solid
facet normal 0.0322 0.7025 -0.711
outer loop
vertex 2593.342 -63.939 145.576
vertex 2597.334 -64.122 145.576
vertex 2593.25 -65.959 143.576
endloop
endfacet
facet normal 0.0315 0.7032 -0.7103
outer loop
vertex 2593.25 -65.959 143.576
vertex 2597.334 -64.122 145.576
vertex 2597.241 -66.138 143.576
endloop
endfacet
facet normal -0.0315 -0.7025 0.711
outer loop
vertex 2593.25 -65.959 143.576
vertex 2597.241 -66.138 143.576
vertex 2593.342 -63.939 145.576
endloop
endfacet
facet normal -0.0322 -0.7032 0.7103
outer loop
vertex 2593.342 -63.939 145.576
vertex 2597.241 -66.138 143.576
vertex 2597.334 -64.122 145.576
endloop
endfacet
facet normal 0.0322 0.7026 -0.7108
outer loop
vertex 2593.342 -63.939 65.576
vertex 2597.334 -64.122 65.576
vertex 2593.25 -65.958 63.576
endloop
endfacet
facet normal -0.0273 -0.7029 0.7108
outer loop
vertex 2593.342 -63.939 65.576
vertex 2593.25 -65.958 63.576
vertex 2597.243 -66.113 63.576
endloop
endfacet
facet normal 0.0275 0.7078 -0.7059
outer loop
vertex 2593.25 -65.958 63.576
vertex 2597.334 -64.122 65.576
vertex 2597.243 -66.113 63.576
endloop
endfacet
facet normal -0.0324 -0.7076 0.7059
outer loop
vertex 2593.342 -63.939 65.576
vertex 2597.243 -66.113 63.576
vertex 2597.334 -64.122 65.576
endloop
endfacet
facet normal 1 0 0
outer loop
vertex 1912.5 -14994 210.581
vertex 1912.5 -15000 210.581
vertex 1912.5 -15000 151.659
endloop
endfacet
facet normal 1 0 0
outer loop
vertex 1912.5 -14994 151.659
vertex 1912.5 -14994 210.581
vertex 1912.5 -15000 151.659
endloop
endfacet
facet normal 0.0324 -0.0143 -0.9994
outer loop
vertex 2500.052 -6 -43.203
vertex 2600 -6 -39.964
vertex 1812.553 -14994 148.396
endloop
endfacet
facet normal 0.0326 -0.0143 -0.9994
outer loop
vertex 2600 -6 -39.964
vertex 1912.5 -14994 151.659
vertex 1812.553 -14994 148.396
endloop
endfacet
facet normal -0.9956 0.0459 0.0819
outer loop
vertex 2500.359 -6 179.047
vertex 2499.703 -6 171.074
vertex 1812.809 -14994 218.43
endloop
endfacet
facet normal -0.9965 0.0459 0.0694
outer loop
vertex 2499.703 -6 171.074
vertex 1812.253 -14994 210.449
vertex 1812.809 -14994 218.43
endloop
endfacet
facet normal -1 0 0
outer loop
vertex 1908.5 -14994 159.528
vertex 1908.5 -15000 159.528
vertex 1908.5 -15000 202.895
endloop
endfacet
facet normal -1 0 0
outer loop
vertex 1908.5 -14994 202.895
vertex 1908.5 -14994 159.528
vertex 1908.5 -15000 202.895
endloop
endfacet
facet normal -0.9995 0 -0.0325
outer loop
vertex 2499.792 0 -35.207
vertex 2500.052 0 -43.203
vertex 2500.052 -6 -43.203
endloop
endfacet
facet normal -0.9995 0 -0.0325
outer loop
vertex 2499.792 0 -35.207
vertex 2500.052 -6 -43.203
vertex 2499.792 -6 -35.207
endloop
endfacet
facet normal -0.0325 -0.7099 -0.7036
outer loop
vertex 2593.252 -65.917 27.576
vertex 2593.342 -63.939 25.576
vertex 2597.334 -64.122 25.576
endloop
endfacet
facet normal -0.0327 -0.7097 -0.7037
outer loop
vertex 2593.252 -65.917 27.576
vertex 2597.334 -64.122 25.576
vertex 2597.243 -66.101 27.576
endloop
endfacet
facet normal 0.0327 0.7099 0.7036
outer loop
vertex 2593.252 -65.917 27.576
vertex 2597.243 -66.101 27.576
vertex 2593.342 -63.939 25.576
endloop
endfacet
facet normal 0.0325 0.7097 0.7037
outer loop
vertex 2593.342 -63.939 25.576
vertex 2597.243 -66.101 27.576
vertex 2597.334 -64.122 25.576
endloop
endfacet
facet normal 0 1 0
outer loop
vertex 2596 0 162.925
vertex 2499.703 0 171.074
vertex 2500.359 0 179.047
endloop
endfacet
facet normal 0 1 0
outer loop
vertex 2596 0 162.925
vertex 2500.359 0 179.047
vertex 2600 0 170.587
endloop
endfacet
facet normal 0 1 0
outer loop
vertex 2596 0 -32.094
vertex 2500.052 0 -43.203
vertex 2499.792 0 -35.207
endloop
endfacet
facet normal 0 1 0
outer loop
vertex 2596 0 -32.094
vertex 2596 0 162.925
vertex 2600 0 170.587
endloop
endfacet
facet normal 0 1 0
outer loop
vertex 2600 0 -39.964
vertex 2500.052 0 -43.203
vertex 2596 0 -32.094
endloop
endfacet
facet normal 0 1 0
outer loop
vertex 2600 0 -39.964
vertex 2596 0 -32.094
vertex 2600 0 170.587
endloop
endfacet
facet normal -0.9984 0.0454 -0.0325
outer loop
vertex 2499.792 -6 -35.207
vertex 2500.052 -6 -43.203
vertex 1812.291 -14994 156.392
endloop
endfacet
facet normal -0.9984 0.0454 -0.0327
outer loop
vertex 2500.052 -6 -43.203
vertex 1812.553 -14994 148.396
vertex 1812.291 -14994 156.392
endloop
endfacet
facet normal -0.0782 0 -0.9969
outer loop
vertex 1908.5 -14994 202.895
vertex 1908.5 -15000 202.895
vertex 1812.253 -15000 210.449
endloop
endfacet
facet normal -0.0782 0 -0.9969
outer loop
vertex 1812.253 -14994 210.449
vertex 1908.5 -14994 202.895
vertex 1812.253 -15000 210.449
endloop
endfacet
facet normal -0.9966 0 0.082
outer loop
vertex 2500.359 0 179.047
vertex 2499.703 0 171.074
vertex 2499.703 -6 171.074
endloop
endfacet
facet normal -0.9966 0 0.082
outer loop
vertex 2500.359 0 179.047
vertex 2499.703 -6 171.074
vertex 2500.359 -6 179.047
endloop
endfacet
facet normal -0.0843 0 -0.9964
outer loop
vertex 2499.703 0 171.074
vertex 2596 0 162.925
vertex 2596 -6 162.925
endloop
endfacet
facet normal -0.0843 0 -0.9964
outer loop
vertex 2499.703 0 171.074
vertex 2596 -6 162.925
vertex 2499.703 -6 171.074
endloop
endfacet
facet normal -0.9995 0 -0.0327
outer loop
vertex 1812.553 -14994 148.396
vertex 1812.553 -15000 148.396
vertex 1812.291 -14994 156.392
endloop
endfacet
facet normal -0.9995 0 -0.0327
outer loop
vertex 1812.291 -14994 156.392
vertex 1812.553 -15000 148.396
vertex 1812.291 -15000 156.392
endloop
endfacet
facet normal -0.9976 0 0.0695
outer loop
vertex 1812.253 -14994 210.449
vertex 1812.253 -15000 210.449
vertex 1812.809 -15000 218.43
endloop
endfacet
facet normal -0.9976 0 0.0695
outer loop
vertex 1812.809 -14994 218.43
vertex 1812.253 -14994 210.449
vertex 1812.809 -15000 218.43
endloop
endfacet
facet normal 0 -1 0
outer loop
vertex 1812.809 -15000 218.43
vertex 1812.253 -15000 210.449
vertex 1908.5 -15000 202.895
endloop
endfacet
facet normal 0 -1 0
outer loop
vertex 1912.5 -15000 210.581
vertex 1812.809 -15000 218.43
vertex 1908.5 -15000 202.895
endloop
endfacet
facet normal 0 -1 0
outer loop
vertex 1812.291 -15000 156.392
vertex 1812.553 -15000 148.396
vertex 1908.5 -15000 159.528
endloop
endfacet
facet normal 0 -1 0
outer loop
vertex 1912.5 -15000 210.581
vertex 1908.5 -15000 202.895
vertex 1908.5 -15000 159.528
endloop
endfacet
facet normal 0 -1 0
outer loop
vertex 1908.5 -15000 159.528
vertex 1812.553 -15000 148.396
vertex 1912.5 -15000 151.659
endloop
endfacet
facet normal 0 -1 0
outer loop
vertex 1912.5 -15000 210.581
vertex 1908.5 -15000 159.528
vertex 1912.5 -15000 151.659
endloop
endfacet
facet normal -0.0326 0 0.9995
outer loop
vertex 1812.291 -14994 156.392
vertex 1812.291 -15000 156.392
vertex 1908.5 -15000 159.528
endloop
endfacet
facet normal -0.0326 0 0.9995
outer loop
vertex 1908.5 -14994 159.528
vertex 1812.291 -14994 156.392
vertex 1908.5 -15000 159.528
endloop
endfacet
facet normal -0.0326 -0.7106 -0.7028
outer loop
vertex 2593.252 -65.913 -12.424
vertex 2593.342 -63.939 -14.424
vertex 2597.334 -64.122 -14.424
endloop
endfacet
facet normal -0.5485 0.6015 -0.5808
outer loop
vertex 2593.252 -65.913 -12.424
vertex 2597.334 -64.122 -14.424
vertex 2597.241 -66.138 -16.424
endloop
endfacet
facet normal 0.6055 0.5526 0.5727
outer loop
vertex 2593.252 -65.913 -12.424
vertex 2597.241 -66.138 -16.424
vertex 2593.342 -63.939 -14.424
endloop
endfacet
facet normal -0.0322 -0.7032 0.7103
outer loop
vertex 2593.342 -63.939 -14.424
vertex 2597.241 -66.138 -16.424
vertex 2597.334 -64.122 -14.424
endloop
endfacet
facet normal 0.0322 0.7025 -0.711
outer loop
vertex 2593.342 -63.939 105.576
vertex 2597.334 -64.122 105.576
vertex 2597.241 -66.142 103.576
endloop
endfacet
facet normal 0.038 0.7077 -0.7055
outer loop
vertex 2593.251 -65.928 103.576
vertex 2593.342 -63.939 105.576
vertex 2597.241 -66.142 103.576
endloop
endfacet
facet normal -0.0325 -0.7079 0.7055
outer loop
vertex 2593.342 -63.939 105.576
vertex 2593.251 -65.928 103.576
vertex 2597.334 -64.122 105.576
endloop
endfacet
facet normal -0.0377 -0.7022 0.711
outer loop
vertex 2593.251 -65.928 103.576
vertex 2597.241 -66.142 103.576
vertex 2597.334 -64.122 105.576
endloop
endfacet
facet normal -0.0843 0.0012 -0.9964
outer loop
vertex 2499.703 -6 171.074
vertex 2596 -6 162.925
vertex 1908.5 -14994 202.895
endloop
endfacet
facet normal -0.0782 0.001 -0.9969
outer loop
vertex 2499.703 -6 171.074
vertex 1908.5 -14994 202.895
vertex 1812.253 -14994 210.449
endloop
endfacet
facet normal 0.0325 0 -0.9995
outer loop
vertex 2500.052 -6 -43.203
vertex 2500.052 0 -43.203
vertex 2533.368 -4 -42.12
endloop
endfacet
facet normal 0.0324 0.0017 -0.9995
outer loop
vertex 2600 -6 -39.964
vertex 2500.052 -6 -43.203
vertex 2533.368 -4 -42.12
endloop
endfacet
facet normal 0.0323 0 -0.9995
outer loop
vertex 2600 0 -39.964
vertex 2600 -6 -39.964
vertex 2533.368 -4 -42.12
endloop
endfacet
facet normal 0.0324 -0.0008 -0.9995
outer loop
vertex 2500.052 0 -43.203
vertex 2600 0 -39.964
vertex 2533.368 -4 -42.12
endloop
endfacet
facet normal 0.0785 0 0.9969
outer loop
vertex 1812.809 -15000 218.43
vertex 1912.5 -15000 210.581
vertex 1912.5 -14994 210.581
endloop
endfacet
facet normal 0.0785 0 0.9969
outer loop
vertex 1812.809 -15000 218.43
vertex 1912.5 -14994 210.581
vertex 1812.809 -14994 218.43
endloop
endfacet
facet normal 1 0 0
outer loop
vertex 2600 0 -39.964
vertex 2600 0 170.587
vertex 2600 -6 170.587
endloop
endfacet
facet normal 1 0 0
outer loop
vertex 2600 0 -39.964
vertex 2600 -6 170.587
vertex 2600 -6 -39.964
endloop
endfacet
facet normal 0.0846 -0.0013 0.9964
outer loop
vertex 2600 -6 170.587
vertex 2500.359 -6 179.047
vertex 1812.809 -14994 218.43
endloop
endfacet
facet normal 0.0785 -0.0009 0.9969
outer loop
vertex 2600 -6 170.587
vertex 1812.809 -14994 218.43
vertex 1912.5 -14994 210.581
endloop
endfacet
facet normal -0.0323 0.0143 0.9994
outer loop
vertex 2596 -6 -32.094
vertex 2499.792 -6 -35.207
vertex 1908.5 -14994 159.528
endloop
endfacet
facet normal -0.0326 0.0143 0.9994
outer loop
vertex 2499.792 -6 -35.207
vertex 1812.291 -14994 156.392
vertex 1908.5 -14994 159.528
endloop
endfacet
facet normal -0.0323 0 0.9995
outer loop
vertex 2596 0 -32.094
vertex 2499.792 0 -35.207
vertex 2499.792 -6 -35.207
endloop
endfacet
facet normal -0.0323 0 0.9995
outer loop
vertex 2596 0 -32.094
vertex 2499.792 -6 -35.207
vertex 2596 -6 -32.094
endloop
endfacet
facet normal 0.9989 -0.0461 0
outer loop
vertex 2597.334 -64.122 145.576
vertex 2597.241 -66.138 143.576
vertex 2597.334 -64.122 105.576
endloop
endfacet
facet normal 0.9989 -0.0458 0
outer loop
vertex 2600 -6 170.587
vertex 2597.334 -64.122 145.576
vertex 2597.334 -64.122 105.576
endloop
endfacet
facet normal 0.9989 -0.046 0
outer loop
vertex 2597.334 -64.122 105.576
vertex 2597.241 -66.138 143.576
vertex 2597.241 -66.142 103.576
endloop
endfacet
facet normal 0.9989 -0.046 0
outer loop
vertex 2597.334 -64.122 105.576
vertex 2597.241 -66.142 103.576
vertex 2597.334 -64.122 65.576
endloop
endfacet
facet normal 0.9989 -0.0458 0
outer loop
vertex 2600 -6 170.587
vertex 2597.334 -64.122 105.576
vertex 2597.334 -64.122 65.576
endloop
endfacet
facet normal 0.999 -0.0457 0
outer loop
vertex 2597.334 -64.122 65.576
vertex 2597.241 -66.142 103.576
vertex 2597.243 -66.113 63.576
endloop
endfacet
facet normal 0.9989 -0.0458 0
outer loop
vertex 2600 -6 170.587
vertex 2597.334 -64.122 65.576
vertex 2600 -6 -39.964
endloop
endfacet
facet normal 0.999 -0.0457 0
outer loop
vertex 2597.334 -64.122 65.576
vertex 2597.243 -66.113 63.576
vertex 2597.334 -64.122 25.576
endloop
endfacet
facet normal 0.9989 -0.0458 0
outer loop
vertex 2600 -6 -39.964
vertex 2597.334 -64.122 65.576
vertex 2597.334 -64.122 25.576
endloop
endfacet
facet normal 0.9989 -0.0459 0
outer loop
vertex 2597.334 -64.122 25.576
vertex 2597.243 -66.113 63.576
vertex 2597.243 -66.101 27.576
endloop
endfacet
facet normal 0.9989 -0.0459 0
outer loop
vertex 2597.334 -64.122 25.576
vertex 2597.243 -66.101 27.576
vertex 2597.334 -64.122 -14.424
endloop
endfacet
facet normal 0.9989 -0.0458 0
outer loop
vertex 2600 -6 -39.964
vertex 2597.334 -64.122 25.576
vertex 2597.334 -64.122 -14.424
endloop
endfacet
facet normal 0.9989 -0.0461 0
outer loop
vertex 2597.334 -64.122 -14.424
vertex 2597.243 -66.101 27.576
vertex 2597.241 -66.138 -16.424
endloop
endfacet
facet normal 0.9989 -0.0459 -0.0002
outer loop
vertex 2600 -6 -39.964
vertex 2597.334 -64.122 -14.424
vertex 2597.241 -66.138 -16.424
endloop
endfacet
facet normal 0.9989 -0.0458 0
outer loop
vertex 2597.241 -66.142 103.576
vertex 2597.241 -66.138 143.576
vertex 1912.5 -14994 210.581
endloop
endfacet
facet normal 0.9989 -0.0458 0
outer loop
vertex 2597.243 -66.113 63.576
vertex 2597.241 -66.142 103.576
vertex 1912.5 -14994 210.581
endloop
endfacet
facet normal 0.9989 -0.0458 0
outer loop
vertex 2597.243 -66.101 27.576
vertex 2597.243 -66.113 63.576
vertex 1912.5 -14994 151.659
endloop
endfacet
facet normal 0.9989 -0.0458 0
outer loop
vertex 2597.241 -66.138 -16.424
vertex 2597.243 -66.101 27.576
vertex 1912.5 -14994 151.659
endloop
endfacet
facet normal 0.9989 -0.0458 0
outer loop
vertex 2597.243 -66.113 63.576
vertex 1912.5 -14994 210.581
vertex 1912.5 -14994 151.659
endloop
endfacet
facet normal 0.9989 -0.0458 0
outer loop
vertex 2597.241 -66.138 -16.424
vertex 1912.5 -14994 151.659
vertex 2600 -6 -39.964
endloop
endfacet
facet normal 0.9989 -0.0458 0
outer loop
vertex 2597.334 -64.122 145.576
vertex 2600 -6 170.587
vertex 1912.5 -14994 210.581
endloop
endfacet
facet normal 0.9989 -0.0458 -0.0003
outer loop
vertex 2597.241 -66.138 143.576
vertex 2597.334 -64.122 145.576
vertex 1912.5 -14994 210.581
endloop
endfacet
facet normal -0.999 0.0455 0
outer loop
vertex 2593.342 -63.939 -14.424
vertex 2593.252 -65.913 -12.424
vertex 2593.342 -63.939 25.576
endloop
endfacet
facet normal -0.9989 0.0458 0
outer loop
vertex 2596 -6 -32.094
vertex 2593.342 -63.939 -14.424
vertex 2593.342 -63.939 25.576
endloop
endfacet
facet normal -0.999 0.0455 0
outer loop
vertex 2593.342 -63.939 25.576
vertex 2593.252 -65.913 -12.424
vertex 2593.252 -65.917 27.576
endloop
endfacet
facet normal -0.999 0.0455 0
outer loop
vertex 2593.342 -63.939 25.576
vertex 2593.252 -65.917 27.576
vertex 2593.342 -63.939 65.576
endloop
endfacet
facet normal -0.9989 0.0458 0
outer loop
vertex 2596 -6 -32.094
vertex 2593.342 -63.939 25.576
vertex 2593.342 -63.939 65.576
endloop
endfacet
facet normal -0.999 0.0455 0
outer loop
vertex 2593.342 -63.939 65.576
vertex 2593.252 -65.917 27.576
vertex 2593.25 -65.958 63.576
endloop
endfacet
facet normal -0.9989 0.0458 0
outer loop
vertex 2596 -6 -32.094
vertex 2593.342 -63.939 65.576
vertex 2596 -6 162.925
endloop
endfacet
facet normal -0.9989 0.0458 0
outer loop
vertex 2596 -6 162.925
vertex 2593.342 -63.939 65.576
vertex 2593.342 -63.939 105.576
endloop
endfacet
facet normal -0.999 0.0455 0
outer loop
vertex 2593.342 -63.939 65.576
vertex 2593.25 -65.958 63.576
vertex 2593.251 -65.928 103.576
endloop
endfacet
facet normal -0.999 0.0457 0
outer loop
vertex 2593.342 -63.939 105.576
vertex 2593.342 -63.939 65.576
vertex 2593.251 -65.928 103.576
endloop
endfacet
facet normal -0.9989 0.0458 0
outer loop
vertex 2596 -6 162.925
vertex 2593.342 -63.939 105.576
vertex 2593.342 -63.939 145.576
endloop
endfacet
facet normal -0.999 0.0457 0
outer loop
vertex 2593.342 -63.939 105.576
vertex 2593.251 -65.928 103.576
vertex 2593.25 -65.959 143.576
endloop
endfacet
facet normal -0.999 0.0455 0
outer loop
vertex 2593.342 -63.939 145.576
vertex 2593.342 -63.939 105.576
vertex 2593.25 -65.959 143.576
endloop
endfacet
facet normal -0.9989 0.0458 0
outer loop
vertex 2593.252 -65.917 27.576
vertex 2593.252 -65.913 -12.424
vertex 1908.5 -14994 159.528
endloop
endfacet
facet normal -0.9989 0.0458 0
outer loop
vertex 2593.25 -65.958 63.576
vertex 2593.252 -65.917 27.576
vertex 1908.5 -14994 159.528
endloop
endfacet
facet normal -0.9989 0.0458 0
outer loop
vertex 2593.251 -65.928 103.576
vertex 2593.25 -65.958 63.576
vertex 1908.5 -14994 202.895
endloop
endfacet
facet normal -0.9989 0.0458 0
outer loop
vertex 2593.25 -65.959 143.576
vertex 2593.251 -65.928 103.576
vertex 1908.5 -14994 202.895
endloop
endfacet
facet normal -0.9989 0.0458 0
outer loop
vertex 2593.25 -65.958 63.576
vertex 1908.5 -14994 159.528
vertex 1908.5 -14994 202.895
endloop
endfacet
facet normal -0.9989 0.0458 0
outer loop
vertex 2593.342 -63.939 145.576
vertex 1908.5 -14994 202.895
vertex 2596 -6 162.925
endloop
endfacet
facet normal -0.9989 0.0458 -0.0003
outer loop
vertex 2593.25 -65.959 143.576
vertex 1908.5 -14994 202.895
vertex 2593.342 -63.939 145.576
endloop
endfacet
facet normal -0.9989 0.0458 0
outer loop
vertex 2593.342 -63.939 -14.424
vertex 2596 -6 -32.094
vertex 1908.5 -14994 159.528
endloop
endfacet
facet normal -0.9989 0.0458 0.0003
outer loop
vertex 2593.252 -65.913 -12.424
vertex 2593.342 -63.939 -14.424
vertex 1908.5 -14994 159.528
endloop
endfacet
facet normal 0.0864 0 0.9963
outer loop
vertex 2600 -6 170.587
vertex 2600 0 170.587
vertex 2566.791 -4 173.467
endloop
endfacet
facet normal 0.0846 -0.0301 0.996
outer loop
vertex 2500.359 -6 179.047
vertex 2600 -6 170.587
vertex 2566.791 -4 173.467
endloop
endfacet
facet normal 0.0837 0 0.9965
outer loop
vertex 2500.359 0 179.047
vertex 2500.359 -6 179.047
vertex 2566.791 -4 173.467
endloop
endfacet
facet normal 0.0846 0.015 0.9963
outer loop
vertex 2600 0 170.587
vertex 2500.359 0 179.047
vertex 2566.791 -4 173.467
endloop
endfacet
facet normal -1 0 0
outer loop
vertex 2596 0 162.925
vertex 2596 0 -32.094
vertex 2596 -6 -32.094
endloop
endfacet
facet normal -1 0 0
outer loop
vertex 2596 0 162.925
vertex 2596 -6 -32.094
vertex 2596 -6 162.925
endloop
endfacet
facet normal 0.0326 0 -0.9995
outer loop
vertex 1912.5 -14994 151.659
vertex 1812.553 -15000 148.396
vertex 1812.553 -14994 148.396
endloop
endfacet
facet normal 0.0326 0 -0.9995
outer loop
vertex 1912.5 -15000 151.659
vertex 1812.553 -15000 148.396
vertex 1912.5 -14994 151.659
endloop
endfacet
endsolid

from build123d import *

# Parameters (mm, degrees)
BOSS_EXTRUDE1_DEPTH       = 6
BOSS_EXTRUDE2_DEPTH       = 6
F_4_0MM_DOWEL_HOLE1_D     = 4
F_4_0MM_DOWEL_HOLE1_DEPTH = 691.048650037


with BuildPart() as part:
    # Sketch1 → Boss-Extrude1 (new body)
    with BuildSketch(Plane(origin=(0, 0, 0), x_dir=(1, 0, 0), z_dir=(0, 1, 0))):
        with BuildLine():
            Line((2600, -170.586848035), (2600, 39.964081965))
            add(Edge.make_bspline(
                [(2500.052462015, 43.202855025), (2533.368165788, 42.118735422), (2566.684003357, 41.038906482), (2600, 39.964081965)],
                knots=[0.814310206, 0.814310206, 0.814310206, 0.814310206, 0.826684648, 0.826684648, 0.826684648, 0.826684648], degree=3))
            Line((2500.052462015, 43.202855025), (2499.792273349, 35.207087279))
            Line((2499.792273349, 35.207087279), (2596, 32.093533273))
            Line((2596, 32.093533273), (2596, -162.925321623))
            Line((2596, -162.925321623), (2499.703486598, -171.073778237))
            Line((2499.703486598, -171.073778237), (2500.358506507, -179.04691745))
            add(Edge.make_bspline(
                [(2600, -170.586848035), (2566.793832387, -173.496724848), (2533.579916888, -176.317668077), (2500.358506507, -179.04691745)],
                knots=[0.174597884, 0.174597884, 0.174597884, 0.174597884, 0.186972113, 0.186972113, 0.186972113, 0.186972113], degree=3))
        make_face()
    extrude(amount=-BOSS_EXTRUDE1_DEPTH)



with BuildPart() as body_2:
    # Sketch2 → Boss-Extrude2 (new body)
    with BuildSketch(Plane(origin=(0, -15000, 0), x_dir=(1, 0, 0), z_dir=(0, 1, 0))):
        with BuildLine():
            Line((1912.5, -210.580889388), (1912.5, -151.658724384))
            add(Edge.make_bspline(
                [(1812.553229164, -148.39636335), (1824.752172678, -148.79613245), (1858.06748925, -149.892488396), (1891.3831508, -150.977462842), (1912.5, -151.658724384)],
                knots=[0.787086448, 0.787086448, 0.787086448, 0.787086448, 0.801585908, 0.826684648, 0.826684648, 0.826684648, 0.826684648], degree=3))
            Line((1812.553229164, -148.39636335), (1812.291203449, -156.392071106))
            Line((1812.291203449, -156.392071106), (1908.5, -159.528330511))
            Line((1908.5, -159.528330511), (1908.5, -202.894849438))
            Line((1908.5, -202.894849438), (1812.252662355, -210.449304162))
            Line((1812.252662355, -210.449304162), (1812.808516239, -218.429969952))
            add(Edge.make_bspline(
                [(1912.5, -210.580889388), (1891.959282547, -212.380885064), (1858.737335883, -215.114757805), (1825.492197957, -217.546550706), (1812.808516239, -218.429969952)],
                knots=[0.174597884, 0.174597884, 0.174597884, 0.174597884, 0.199092181, 0.214195944, 0.214195944, 0.214195944, 0.214195944], degree=3))
        make_face()
    extrude(amount=BOSS_EXTRUDE2_DEPTH)


with BuildPart() as part_1:
    add(part.part)

    add(body_2.part)  # loft1 joins it to this body
    # loft from a face of the part (loft1)
    loft([part_1.faces().sort_by_distance((2549.978703163, -6, 172.455031752))[0], part_1.faces().sort_by_distance((1862.575784766, -14994, 213.50968439))[0]])

    # Ø4.0mm Dowel Hole1
    with Locations(Plane(origin=(2592.577472154, -80.613597565, -62.953690956), x_dir=(-0.04582184873701848, -0.9989496274479118, 0), z_dir=(-0.9989496274479118, 0.04582184873701848, 0))):
        with Locations((-14.692264944, 128.529423621), (-14.69226494, 208.529423621), (-14.692264942, 168.529423621), (-14.692264948, 48.529423621), (-14.692264946, 88.529423621)):
            Hole(F_4_0MM_DOWEL_HOLE1_D / 2, depth=F_4_0MM_DOWEL_HOLE1_DEPTH)


solid = part_1.part
